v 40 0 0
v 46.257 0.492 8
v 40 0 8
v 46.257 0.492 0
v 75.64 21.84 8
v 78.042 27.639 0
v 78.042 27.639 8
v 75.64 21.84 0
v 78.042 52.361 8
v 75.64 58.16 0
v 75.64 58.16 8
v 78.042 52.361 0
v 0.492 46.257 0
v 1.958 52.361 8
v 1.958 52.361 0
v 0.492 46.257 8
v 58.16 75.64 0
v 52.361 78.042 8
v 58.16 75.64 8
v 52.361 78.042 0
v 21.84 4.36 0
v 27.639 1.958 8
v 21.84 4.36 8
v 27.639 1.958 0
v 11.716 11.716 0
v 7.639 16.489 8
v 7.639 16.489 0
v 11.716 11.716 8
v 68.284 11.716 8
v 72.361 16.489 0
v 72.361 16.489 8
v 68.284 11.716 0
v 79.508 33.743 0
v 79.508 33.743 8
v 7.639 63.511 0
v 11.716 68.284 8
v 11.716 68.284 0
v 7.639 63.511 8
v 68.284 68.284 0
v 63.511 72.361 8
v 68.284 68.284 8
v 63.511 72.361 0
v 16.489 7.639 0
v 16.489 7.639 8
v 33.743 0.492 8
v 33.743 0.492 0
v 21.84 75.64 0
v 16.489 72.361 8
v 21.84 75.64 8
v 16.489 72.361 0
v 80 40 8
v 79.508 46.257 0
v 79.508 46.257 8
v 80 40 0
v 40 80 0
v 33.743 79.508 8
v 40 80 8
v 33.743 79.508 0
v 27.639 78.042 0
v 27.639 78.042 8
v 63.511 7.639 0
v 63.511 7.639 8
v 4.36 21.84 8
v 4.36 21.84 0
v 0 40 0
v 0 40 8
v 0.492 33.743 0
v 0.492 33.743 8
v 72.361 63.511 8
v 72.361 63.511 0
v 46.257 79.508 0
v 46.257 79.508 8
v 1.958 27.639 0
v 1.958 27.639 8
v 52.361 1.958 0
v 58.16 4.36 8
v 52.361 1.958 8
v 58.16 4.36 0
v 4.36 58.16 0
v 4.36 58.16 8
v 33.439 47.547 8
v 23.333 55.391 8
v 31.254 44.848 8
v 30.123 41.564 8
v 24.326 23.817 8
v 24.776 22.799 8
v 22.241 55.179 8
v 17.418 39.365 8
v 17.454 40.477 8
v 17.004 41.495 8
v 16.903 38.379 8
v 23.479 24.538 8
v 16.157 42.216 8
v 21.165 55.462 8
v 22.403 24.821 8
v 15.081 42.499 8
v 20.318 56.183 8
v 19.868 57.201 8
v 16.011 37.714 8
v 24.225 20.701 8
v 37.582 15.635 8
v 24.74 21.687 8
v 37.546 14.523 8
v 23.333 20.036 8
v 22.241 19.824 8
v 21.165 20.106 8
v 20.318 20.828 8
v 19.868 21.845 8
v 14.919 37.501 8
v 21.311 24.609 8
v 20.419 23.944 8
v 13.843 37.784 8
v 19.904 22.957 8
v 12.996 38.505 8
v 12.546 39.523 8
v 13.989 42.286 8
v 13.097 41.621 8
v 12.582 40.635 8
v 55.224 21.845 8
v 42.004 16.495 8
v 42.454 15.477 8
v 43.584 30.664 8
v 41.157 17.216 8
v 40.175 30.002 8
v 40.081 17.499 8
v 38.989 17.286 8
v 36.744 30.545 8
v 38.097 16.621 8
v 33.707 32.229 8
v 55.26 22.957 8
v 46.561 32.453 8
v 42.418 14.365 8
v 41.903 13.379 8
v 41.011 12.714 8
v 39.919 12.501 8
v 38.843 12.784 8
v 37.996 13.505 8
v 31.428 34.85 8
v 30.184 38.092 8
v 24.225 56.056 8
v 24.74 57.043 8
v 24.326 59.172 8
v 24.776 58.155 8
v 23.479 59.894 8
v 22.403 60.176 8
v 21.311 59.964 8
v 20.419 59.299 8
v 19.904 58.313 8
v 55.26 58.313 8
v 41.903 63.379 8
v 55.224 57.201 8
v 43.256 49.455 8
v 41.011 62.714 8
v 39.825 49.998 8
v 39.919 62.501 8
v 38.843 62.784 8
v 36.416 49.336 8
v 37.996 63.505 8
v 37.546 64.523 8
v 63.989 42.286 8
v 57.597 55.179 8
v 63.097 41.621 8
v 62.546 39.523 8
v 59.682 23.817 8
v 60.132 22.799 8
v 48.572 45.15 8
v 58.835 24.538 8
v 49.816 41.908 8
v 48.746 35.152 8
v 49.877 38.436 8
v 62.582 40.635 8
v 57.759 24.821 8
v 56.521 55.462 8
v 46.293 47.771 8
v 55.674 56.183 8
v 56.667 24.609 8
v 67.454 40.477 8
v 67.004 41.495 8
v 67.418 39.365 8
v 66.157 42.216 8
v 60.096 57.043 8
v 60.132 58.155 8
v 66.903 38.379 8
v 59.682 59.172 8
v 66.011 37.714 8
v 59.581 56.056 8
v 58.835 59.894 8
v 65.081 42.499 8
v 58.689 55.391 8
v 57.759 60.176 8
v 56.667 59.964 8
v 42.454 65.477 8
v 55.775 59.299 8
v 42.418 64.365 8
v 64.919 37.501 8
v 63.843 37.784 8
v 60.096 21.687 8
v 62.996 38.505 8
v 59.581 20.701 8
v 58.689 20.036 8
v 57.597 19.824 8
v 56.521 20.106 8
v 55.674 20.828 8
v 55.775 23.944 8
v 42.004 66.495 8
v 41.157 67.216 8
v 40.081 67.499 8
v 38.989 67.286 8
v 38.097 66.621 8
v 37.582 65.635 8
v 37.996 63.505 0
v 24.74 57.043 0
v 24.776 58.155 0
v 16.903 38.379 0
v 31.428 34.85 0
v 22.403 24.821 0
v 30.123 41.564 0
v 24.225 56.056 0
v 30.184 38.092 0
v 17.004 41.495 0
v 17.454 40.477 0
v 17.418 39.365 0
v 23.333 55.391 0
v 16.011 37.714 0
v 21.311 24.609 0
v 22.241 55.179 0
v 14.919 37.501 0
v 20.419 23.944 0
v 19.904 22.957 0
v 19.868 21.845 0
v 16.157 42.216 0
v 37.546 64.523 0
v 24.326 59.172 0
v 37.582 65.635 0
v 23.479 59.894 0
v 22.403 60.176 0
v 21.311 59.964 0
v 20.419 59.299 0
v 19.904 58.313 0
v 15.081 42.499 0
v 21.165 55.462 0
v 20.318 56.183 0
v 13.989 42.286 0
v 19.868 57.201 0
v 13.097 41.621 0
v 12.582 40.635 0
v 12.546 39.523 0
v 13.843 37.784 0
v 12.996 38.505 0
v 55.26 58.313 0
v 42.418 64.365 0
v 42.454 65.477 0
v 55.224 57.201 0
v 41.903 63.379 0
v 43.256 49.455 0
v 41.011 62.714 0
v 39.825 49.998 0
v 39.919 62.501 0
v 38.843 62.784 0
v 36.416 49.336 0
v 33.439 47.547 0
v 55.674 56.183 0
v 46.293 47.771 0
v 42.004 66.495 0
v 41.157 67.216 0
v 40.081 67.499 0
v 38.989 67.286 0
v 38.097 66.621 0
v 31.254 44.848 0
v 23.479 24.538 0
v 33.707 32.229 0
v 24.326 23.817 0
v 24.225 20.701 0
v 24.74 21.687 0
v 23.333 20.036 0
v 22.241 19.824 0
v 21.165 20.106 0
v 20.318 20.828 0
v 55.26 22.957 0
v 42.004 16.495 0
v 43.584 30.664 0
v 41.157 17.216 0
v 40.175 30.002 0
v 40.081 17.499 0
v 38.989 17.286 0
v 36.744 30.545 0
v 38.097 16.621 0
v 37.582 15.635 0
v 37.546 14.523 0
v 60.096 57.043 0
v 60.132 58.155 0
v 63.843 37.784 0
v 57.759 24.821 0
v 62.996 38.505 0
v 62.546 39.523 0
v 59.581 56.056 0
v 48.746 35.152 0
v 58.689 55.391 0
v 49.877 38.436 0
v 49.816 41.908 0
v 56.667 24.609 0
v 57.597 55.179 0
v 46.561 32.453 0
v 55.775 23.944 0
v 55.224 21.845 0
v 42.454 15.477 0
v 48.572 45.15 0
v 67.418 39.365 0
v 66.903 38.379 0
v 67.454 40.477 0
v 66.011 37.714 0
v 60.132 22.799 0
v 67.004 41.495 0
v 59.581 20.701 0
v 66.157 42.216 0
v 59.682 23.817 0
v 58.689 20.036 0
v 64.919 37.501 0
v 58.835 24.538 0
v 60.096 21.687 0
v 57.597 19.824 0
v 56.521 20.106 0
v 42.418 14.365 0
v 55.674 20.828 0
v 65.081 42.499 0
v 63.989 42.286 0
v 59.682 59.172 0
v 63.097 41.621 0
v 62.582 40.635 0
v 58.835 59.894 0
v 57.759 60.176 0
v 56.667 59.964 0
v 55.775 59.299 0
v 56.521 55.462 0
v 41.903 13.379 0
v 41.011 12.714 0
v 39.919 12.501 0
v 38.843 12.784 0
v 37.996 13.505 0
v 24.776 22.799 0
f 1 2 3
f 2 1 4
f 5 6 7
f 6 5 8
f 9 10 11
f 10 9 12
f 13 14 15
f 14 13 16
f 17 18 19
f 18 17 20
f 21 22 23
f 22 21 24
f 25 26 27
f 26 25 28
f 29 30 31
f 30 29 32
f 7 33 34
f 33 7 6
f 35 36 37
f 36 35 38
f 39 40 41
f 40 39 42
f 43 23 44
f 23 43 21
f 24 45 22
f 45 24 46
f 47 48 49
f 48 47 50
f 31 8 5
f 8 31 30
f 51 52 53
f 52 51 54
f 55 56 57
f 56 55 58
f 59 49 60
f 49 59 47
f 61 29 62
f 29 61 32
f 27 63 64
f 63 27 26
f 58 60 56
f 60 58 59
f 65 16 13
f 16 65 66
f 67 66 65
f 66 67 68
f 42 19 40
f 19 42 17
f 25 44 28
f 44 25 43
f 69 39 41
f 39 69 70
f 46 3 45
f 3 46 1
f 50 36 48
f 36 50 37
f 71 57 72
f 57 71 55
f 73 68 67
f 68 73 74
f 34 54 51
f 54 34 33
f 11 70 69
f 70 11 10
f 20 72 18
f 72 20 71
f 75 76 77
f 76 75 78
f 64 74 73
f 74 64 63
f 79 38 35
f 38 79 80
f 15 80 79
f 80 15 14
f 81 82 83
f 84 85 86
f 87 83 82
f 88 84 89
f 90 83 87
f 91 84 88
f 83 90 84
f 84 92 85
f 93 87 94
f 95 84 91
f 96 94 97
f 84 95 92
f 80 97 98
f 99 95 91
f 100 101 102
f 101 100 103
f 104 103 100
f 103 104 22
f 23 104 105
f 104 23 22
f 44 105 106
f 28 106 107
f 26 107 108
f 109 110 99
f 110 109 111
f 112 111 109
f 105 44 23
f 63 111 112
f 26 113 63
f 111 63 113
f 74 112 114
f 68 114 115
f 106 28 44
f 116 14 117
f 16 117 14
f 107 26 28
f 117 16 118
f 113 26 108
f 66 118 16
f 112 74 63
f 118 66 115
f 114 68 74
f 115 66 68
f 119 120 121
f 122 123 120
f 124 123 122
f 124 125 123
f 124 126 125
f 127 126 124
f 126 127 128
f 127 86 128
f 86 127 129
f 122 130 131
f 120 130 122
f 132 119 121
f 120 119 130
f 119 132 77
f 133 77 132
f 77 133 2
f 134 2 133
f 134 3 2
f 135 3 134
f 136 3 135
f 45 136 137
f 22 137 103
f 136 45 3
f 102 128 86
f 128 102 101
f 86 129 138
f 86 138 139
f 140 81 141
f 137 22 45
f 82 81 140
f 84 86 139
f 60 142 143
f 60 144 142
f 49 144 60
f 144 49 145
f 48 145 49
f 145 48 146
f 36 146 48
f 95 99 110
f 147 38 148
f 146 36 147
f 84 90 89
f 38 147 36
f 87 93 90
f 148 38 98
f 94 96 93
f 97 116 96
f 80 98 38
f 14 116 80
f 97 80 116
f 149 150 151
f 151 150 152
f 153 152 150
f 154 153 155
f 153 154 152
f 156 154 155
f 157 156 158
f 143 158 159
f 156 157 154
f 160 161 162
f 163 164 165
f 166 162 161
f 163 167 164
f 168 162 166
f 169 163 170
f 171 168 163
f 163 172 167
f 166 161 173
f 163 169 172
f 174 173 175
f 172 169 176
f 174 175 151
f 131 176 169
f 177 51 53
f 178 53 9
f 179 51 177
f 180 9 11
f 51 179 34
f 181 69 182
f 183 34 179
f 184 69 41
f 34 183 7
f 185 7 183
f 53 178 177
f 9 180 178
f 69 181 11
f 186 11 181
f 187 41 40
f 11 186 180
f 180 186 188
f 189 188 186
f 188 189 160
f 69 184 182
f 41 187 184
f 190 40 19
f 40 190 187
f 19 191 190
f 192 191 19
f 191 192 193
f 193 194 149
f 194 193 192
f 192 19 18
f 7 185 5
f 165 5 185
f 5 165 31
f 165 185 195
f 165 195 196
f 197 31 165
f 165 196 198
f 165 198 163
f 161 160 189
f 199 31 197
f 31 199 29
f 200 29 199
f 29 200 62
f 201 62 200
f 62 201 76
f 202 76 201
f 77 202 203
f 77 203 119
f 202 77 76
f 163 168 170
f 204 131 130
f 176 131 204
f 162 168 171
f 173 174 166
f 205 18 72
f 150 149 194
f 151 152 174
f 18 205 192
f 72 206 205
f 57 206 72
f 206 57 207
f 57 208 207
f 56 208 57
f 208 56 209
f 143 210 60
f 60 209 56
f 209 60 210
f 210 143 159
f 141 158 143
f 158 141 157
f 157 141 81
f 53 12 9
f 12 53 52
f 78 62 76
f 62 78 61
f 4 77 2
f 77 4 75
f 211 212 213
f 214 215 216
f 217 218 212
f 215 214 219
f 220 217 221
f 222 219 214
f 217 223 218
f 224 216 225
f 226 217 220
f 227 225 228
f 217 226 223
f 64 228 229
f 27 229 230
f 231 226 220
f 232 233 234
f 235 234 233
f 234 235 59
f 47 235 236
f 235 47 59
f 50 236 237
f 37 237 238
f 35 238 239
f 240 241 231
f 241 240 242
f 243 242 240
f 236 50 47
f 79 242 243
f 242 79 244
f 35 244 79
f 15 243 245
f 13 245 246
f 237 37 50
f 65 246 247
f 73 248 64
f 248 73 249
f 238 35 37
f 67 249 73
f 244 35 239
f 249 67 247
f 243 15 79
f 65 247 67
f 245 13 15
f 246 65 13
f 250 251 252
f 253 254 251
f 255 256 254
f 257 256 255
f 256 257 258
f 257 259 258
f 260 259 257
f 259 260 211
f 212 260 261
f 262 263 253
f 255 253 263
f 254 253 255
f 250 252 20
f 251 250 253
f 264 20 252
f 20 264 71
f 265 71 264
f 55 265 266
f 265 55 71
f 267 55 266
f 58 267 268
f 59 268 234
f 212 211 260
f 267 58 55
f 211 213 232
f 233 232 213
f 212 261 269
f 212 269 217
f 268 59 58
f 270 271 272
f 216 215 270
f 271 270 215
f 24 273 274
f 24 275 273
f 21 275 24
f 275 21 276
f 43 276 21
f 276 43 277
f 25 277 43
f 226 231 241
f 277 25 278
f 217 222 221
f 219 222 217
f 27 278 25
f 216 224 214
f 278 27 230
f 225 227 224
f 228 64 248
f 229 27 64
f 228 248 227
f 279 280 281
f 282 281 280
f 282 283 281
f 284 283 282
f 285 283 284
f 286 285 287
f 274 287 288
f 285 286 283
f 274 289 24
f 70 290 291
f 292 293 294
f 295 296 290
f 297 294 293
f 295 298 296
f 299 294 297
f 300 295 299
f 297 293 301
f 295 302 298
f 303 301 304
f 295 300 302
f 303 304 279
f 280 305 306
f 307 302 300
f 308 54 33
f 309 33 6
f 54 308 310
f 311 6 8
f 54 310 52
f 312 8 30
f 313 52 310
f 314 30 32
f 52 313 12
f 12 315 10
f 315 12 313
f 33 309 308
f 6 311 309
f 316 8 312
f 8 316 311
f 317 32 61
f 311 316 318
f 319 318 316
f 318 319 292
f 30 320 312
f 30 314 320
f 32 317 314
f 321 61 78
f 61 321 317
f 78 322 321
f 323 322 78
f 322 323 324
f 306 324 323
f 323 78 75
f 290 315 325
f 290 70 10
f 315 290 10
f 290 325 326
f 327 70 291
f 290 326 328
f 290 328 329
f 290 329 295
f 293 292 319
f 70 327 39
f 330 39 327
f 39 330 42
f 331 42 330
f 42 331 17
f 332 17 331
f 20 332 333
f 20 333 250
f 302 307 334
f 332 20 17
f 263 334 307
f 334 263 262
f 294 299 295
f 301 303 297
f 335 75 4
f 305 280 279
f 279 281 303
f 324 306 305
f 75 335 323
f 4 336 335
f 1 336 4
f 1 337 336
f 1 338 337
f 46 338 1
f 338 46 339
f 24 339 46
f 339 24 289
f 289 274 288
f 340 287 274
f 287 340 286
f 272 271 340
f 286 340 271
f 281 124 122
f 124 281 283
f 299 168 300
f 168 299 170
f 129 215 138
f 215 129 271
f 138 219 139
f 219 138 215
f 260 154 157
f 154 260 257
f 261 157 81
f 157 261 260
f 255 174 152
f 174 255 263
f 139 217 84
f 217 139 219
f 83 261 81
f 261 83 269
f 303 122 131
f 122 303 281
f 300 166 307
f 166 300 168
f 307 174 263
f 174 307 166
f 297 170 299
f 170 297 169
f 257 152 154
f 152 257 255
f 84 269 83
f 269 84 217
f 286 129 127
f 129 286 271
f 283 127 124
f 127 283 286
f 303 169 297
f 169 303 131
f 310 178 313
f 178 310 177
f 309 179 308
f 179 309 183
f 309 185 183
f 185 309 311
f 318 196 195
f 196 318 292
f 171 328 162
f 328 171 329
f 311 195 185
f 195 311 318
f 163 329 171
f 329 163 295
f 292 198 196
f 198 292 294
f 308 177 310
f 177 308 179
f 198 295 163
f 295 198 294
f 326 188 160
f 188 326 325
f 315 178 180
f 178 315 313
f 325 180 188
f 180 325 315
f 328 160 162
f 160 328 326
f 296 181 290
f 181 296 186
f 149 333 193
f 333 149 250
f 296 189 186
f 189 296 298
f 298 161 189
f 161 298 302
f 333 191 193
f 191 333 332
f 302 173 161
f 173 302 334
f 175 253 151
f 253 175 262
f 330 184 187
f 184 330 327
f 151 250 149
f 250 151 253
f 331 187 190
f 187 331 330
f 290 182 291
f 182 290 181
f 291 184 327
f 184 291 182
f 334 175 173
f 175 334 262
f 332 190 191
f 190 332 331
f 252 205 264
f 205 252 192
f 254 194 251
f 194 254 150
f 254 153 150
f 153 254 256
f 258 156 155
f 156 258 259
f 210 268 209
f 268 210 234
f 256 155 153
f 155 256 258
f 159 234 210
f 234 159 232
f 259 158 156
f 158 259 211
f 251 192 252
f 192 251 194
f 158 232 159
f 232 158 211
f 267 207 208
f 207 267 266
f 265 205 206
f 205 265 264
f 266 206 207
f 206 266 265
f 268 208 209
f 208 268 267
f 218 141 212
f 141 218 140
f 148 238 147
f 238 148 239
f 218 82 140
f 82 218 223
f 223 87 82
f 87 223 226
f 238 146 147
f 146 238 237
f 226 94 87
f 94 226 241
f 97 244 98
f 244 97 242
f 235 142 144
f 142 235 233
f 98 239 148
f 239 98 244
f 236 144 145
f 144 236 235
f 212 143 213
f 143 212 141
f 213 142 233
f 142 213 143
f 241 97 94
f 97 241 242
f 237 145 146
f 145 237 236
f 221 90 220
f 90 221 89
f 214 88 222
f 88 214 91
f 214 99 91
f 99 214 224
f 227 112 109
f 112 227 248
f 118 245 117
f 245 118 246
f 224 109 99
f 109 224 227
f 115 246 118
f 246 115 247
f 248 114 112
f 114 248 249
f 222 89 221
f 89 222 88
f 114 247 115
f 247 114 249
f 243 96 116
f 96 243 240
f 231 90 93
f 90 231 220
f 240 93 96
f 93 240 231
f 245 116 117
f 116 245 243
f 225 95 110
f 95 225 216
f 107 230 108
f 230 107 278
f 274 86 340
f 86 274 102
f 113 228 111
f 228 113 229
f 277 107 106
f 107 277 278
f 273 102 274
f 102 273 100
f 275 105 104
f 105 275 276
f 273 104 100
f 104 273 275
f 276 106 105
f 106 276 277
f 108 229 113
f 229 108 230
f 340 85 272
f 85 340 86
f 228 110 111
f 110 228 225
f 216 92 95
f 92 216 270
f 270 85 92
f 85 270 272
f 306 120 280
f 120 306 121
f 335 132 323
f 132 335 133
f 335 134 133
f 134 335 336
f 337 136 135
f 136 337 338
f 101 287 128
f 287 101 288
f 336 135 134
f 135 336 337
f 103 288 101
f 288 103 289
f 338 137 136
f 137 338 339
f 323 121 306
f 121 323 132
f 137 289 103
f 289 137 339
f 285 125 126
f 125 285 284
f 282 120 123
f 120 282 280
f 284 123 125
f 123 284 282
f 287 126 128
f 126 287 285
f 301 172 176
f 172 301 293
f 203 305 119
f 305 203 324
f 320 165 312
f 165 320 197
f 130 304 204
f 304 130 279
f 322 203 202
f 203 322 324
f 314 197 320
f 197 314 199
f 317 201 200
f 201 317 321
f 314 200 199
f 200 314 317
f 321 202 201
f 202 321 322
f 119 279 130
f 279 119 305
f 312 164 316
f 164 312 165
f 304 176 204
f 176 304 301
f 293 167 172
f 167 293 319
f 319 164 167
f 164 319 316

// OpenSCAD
$fn = 32;

// ----------------------------------------------------------------------
// Spacer plate: round flange R40, 8 bolts
// ----------------------------------------------------------------------

// --- parameters (mm) ---
bore_r = 10;              // centre bore radius
bolt_r = 2.5;             // bolt hole radius
plate_t = 8;              // plate thickness, Z (extrusion height)
flange_r = 40;            // flange radius
n_bolt = 8;               // bolt hole count
ring_r = 25;              // bolt circle radius

profile = [[80, 40], [79.508, 46.257], [78.042, 52.361], [75.64, 58.16], [72.361, 63.511], [68.284, 68.284], [63.511, 72.361], [58.16, 75.64], [52.361, 78.042], [46.257, 79.508], [40, 80], [33.743, 79.508], [27.639, 78.042], [21.84, 75.64], [16.489, 72.361], [11.716, 68.284], [7.639, 63.511], [4.36, 58.16], [1.958, 52.361], [0.492, 46.257], [0, 40], [0.492, 33.743], [1.958, 27.639], [4.36, 21.84], [7.639, 16.489], [11.716, 11.716], [16.489, 7.639], [21.84, 4.36], [27.639, 1.958], [33.743, 0.492], [40, 0], [46.257, 0.492], [52.361, 1.958], [58.16, 4.36], [63.511, 7.639], [68.284, 11.716], [72.361, 16.489], [75.64, 21.84], [78.042, 27.639], [79.508, 33.743]];  // primary outline, 40 points, counter clockwise
void_1 = [[49.816, 41.908], [48.572, 45.15], [46.293, 47.771], [43.256, 49.455], [39.825, 49.998], [36.416, 49.336], [33.439, 47.547], [31.254, 44.848], [30.123, 41.564], [30.184, 38.092], [31.428, 34.85], [33.707, 32.229], [36.744, 30.545], [40.175, 30.002], [43.584, 30.664], [46.561, 32.453], [48.746, 35.152], [49.877, 38.436]];  // centre bore, 18 points
void_2 = [[67.454, 40.477], [67.004, 41.495], [66.157, 42.216], [65.081, 42.499], [63.989, 42.286], [63.097, 41.621], [62.582, 40.635], [62.546, 39.523], [62.996, 38.505], [63.843, 37.784], [64.919, 37.501], [66.011, 37.714], [66.903, 38.379], [67.418, 39.365]];  // bolt hole 1, 14 points
void_3 = [[60.132, 58.155], [59.682, 59.172], [58.835, 59.894], [57.759, 60.176], [56.667, 59.964], [55.775, 59.299], [55.26, 58.313], [55.224, 57.201], [55.674, 56.183], [56.521, 55.462], [57.597, 55.179], [58.689, 55.391], [59.581, 56.056], [60.096, 57.043]];  // bolt hole 2, 14 points
void_4 = [[42.454, 65.477], [42.004, 66.495], [41.157, 67.216], [40.081, 67.499], [38.989, 67.286], [38.097, 66.621], [37.582, 65.635], [37.546, 64.523], [37.996, 63.505], [38.843, 62.784], [39.919, 62.501], [41.011, 62.714], [41.903, 63.379], [42.418, 64.365]];  // bolt hole 3, 14 points
void_5 = [[24.776, 58.155], [24.326, 59.172], [23.479, 59.894], [22.403, 60.176], [21.311, 59.964], [20.419, 59.299], [19.904, 58.313], [19.868, 57.201], [20.318, 56.183], [21.165, 55.462], [22.241, 55.179], [23.333, 55.391], [24.225, 56.056], [24.74, 57.043]];  // bolt hole 4, 14 points
void_6 = [[17.454, 40.477], [17.004, 41.495], [16.157, 42.216], [15.081, 42.499], [13.989, 42.286], [13.097, 41.621], [12.582, 40.635], [12.546, 39.523], [12.996, 38.505], [13.843, 37.784], [14.919, 37.501], [16.011, 37.714], [16.903, 38.379], [17.418, 39.365]];  // bolt hole 5, 14 points
void_7 = [[24.776, 22.799], [24.326, 23.817], [23.479, 24.538], [22.403, 24.821], [21.311, 24.609], [20.419, 23.944], [19.904, 22.957], [19.868, 21.845], [20.318, 20.828], [21.165, 20.106], [22.241, 19.824], [23.333, 20.036], [24.225, 20.701], [24.74, 21.687]];  // bolt hole 6, 14 points
void_8 = [[42.454, 15.477], [42.004, 16.495], [41.157, 17.216], [40.081, 17.499], [38.989, 17.286], [38.097, 16.621], [37.582, 15.635], [37.546, 14.523], [37.996, 13.505], [38.843, 12.784], [39.919, 12.501], [41.011, 12.714], [41.903, 13.379], [42.418, 14.365]];  // bolt hole 7, 14 points
void_9 = [[60.132, 22.799], [59.682, 23.817], [58.835, 24.538], [57.759, 24.821], [56.667, 24.609], [55.775, 23.944], [55.26, 22.957], [55.224, 21.845], [55.674, 20.828], [56.521, 20.106], [57.597, 19.824], [58.689, 20.036], [59.581, 20.701], [60.096, 21.687]];  // bolt hole 8, 14 points

// --- the one profile operation ---
difference() {
  linear_extrude(height = plate_t) polygon(points = profile);
  translate([0, 0, -1])
    linear_extrude(height = plate_t + 2) polygon(points = void_1);
  translate([0, 0, -1])
    linear_extrude(height = plate_t + 2) polygon(points = void_2);
  translate([0, 0, -1])
    linear_extrude(height = plate_t + 2) polygon(points = void_3);
  translate([0, 0, -1])
    linear_extrude(height = plate_t + 2) polygon(points = void_4);
  translate([0, 0, -1])
    linear_extrude(height = plate_t + 2) polygon(points = void_5);
  translate([0, 0, -1])
    linear_extrude(height = plate_t + 2) polygon(points = void_6);
  translate([0, 0, -1])
    linear_extrude(height = plate_t + 2) polygon(points = void_7);
  translate([0, 0, -1])
    linear_extrude(height = plate_t + 2) polygon(points = void_8);
  translate([0, 0, -1])
    linear_extrude(height = plate_t + 2) polygon(points = void_9);
}
